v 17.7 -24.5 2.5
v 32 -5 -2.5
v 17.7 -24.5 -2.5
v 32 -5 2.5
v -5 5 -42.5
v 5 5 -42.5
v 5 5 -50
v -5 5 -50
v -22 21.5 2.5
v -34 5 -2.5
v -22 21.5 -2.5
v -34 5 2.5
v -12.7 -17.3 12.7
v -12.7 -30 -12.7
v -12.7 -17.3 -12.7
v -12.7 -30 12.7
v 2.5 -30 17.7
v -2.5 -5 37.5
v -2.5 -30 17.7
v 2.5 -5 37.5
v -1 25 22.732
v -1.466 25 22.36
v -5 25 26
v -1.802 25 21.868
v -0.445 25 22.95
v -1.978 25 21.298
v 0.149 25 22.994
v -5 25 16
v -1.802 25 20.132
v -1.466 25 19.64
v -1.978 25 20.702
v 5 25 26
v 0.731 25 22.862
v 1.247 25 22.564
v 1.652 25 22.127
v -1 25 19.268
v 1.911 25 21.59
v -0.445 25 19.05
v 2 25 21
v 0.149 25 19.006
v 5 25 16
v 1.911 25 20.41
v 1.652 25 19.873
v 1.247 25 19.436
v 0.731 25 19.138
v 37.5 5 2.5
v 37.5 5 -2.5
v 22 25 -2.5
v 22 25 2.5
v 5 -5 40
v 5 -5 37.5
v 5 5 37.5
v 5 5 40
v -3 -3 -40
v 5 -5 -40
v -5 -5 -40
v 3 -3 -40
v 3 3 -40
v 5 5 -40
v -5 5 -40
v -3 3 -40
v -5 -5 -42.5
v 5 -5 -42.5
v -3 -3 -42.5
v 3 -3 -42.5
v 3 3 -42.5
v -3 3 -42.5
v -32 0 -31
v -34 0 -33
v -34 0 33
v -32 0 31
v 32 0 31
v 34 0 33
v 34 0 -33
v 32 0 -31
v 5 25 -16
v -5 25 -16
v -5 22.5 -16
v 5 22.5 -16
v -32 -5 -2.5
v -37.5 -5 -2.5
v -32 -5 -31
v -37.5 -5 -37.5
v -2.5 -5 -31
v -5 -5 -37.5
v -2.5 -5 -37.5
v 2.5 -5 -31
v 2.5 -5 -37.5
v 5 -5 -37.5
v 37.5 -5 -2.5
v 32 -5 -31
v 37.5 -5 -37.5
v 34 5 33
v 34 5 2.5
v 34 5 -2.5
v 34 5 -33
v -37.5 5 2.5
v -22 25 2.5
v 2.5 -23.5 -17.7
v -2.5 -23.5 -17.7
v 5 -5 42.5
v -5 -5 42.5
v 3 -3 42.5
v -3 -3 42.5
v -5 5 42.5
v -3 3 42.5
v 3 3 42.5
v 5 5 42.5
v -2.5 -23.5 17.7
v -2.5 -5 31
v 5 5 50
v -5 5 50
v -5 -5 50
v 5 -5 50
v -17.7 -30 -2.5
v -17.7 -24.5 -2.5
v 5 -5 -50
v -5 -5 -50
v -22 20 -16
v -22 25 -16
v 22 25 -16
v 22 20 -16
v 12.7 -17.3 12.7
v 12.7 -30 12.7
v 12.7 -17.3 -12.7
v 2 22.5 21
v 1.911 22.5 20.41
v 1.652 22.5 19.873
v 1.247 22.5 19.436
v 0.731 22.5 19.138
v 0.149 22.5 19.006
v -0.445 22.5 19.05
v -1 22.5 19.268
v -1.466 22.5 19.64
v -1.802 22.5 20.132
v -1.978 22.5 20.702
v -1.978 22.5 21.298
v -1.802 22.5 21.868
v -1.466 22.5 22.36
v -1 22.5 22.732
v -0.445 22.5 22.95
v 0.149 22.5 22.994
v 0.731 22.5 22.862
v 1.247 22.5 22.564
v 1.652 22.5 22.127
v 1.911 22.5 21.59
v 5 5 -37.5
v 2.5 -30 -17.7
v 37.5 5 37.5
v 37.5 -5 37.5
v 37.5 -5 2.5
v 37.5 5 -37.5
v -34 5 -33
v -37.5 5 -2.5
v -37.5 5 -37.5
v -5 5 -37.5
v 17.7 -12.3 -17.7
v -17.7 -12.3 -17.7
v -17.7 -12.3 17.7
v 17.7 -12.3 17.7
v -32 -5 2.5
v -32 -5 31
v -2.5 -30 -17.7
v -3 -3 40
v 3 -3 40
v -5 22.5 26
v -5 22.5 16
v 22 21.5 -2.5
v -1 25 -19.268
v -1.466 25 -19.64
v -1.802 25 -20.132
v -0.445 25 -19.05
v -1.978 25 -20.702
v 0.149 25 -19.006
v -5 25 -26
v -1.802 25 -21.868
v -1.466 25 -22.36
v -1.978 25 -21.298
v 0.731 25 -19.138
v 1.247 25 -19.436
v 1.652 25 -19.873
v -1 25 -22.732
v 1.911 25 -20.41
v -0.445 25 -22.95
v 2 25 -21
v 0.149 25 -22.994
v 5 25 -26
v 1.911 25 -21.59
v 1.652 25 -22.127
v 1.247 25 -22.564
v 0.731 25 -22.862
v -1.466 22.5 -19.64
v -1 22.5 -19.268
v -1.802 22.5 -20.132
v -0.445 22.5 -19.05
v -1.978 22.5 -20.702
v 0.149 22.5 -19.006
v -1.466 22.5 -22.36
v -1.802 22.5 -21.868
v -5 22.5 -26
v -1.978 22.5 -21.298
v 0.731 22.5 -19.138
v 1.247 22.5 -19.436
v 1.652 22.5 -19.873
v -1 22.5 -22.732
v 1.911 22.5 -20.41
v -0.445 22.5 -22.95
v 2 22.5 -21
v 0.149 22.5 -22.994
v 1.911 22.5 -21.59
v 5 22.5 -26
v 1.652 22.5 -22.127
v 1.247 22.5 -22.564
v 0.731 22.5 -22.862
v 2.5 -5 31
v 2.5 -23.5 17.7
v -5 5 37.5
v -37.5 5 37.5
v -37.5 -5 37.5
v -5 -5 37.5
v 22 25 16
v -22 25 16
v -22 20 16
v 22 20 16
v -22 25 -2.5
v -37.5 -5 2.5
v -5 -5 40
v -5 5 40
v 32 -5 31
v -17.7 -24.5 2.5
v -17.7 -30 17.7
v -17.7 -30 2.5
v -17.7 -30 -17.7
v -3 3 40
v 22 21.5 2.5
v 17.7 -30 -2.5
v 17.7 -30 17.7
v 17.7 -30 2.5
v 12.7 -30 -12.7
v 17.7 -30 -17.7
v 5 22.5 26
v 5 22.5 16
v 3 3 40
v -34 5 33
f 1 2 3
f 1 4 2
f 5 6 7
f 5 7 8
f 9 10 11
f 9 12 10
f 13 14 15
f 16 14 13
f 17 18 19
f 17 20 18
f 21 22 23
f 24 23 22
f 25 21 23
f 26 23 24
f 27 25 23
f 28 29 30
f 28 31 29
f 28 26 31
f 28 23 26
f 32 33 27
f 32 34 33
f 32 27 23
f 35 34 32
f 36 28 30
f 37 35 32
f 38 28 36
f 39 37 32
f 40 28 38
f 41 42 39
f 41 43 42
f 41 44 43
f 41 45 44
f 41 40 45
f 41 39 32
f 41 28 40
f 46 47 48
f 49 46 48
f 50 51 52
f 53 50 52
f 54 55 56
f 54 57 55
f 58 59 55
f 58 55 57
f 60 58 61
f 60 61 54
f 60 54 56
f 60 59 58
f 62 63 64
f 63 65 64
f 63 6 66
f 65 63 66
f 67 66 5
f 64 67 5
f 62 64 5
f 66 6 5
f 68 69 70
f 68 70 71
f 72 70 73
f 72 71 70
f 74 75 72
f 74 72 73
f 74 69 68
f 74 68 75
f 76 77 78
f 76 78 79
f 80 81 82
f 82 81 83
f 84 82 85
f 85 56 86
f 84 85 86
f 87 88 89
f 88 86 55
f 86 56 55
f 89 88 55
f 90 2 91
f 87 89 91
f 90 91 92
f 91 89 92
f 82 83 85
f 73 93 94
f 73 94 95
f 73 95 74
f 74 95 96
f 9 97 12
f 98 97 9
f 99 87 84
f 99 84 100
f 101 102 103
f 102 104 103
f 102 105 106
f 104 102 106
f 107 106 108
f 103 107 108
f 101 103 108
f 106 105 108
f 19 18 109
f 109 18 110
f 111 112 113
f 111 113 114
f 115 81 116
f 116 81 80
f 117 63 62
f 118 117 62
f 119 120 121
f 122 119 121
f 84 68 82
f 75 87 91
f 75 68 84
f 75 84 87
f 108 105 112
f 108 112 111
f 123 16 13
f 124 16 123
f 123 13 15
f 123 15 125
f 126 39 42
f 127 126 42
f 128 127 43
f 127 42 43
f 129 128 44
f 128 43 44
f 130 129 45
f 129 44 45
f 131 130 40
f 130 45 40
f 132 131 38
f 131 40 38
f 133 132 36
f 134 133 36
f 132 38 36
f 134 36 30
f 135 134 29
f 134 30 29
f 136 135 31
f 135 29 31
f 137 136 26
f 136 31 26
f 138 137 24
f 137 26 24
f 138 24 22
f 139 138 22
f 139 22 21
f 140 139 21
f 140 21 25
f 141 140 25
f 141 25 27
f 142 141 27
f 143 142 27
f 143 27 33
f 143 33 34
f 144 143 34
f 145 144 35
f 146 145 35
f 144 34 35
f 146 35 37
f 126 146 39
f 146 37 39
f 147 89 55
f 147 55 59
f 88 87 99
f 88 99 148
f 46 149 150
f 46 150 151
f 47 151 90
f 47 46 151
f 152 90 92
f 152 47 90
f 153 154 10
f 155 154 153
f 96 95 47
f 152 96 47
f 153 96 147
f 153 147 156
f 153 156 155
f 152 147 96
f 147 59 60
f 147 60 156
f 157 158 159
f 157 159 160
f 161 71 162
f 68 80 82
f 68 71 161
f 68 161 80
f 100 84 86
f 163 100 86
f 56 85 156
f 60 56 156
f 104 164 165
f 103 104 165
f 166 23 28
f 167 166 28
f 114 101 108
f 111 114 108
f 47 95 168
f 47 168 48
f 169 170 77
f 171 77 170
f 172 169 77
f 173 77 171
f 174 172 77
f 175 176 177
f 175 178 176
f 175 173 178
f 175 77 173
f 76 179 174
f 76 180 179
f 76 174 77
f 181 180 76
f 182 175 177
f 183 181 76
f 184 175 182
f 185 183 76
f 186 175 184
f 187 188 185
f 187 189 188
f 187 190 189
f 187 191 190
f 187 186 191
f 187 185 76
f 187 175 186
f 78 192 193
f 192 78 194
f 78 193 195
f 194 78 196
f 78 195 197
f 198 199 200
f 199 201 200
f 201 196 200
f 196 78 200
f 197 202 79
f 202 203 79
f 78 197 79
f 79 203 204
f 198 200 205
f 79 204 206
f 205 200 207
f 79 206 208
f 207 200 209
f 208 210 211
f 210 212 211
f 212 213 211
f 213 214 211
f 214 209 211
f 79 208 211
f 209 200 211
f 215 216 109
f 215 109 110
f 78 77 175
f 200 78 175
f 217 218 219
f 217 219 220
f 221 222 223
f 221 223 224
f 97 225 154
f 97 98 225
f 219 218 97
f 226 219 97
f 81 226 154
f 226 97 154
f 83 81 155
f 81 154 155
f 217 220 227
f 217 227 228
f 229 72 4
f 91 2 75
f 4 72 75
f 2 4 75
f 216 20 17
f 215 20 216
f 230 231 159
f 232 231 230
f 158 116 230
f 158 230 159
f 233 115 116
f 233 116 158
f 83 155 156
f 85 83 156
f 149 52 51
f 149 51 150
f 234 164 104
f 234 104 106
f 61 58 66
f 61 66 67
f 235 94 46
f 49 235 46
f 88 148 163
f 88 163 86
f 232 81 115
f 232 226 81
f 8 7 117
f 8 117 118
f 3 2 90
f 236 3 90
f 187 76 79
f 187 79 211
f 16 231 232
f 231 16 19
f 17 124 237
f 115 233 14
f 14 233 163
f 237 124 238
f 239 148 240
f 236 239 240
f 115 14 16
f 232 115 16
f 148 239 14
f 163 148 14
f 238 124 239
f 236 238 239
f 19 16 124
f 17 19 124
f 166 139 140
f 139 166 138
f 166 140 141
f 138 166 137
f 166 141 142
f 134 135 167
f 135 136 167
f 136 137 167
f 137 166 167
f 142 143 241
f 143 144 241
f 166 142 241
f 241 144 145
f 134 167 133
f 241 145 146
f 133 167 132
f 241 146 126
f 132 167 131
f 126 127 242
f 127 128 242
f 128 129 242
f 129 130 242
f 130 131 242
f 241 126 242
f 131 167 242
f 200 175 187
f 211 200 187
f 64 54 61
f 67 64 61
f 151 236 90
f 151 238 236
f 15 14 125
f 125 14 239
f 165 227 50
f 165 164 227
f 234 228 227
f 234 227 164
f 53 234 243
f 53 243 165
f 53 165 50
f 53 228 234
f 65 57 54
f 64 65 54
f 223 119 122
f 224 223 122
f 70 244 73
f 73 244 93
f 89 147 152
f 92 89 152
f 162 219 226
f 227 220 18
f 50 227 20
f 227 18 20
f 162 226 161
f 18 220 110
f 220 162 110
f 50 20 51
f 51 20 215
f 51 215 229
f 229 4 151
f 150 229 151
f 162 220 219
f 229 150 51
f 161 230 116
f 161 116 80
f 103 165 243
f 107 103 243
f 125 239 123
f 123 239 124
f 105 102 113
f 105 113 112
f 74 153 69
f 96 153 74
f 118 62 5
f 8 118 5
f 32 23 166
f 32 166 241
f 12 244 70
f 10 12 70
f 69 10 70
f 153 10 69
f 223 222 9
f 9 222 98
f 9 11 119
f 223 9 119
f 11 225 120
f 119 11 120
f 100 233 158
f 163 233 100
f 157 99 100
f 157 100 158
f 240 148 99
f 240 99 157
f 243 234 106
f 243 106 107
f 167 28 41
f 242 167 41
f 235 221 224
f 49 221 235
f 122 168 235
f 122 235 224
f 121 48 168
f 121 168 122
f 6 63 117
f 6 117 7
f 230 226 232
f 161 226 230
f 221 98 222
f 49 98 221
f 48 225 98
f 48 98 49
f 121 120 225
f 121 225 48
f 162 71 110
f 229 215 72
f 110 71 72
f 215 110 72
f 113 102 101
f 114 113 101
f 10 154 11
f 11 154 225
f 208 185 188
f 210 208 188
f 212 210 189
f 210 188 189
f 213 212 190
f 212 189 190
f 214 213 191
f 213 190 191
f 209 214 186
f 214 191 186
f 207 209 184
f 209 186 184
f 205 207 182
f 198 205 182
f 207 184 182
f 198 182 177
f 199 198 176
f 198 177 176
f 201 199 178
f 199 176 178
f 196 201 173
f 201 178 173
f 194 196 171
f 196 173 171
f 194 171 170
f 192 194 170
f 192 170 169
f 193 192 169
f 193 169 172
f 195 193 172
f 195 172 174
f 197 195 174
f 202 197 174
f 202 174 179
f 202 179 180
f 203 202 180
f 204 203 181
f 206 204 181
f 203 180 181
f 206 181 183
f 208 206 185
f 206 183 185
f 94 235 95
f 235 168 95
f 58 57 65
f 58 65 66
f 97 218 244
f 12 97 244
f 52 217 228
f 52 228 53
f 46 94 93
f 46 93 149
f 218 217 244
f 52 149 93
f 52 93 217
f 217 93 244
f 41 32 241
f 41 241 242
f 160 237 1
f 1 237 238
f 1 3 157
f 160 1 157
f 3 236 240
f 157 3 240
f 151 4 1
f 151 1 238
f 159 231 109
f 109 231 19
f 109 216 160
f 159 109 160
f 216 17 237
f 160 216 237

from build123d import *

# Parameters (mm, degrees)
SKETCH2_W              = 75
SKETCH2_H              = 75
BOSS_EXTRUDE1_DEPTH    = 5
SKETCH2_2_W            = 75
SKETCH2_2_H            = 75
BOSS_EXTRUDE2_DEPTH    = 5
SKETCH4_W              = 68
SKETCH4_H              = 66
CUT_EXTRUDE1_DEPTH     = 5
SKETCH5_W              = 64
SKETCH5_H              = 62
CUT_EXTRUDE2_DEPTH     = 5
SKETCH6_W              = 10
SKETCH6_H              = 10
BOSS_EXTRUDE3_DEPTH    = 2.5
SKETCH7_W              = 6
SKETCH7_H              = 6
BOSS_EXTRUDE4_DEPTH    = 2.5
SKETCH8_W              = 10
SKETCH8_H              = 10
BOSS_EXTRUDE5_DEPTH    = 7.5
SKETCH9_W              = 10
SKETCH9_H              = 10
BOSS_EXTRUDE6_DEPTH    = 2.5
SKETCH10_W             = 6
SKETCH10_H             = 6
BOSS_EXTRUDE7_DEPTH    = 2.5
SKETCH11_W             = 10
SKETCH11_H             = 10
BOSS_EXTRUDE8_DEPTH    = 7.5
SKETCH12_W             = 35.4
SKETCH12_H             = 35.4
BOSS_EXTRUDE9_DEPTH    = 17.7
SKETCH13_W             = 25.4
SKETCH13_H             = 25.4
CUT_EXTRUDE3_DEPTH     = 12.7
SKETCH14_W             = 44
SKETCH14_H             = 32
BOSS_EXTRUDE10_DEPTH   = 5
BOSS_EXTRUDE11_DEPTH   = 2.5
BOSS_EXTRUDE12_DEPTH   = 2.5
BOSS_EXTRUDE13_DEPTH   = 2.5
BOSS_EXTRUDE14_DEPTH   = 2.5
BOSS_EXTRUDE21_DEPTH   = 2.5
BOSS_EXTRUDE22_DEPTH   = 2.5
BOSS_EXTRUDE23_DEPTH   = 2.5
BOSS_EXTRUDE24_DEPTH   = 2.5
SKETCH22_W             = 10
SKETCH22_H             = 10
BOSS_EXTRUDE25_DEPTH   = 2.5
BOSS_EXTRUDE25_2_DEPTH = 2.5
SKETCH23_R             = 2
CUT_EXTRUDE4_DEPTH     = 2.5


with BuildPart() as part:
    # Sketch2 → Boss-Extrude1 (new body)
    with BuildSketch(Plane(origin=(0, 0, 0), x_dir=(1, 0, 0), z_dir=(0, 1, 0))):
        Rectangle(SKETCH2_W, SKETCH2_H)
    extrude(amount=BOSS_EXTRUDE1_DEPTH)

    # Sketch2<2> → Boss-Extrude2 (add)
    with BuildSketch(Plane(origin=(0, 0, 0), x_dir=(1, 0, 0), z_dir=(0, 1, 0))):
        Rectangle(SKETCH2_2_W, SKETCH2_2_H)
    extrude(amount=-BOSS_EXTRUDE2_DEPTH)

    # Sketch4 → Cut-Extrude1 (cut)
    with BuildSketch(Plane(origin=(0, 5, 0), x_dir=(1, 0, 0), z_dir=(0, 1, 0))):
        Rectangle(SKETCH4_W, SKETCH4_H)
    extrude(amount=-CUT_EXTRUDE1_DEPTH, mode=Mode.SUBTRACT)

    # Sketch5 → Cut-Extrude2 (cut)
    with BuildSketch(Plane(origin=(0, 0, 0), x_dir=(1, 0, 0), z_dir=(0, 1, 0))):
        Rectangle(SKETCH5_W, SKETCH5_H)
    extrude(amount=-CUT_EXTRUDE2_DEPTH, mode=Mode.SUBTRACT)

    # Sketch6 → Boss-Extrude3 (add)
    with BuildSketch(Plane.XY.offset(37.5)):
        Rectangle(SKETCH6_W, SKETCH6_H)
    extrude(amount=BOSS_EXTRUDE3_DEPTH)

    # Sketch7 → Boss-Extrude4 (add)
    with BuildSketch(Plane.XY.offset(40)):
        Rectangle(SKETCH7_W, SKETCH7_H)
    extrude(amount=BOSS_EXTRUDE4_DEPTH)

    # Sketch8 → Boss-Extrude5 (add)
    with BuildSketch(Plane.XY.offset(42.5)):
        Rectangle(SKETCH8_W, SKETCH8_H)
    extrude(amount=BOSS_EXTRUDE5_DEPTH)

    # Sketch9 → Boss-Extrude6 (add)
    with BuildSketch(Plane(origin=(0, 0, -37.5), x_dir=(-1, 0, 0), z_dir=(0, 0, -1))):
        Rectangle(SKETCH9_W, SKETCH9_H)
    extrude(amount=BOSS_EXTRUDE6_DEPTH)

    # Sketch10 → Boss-Extrude7 (add)
    with BuildSketch(Plane(origin=(0, 0, -40), x_dir=(-1, 0, 0), z_dir=(0, 0, -1))):
        Rectangle(SKETCH10_W, SKETCH10_H)
    extrude(amount=BOSS_EXTRUDE7_DEPTH)

    # Sketch11 → Boss-Extrude8 (add)
    with BuildSketch(Plane(origin=(0, 0, -42.5), x_dir=(-1, 0, 0), z_dir=(0, 0, -1))):
        Rectangle(SKETCH11_W, SKETCH11_H)
    extrude(amount=BOSS_EXTRUDE8_DEPTH)



with BuildPart() as body_2:
    # Sketch12 → Boss-Extrude9 (new body)
    with BuildSketch(Plane(origin=(0, -30, 0), x_dir=(1, 0, 0), z_dir=(0, 1, 0))):
        Rectangle(SKETCH12_W, SKETCH12_H)
    extrude(amount=BOSS_EXTRUDE9_DEPTH)

    # Sketch13 → Cut-Extrude3 (cut)
    with BuildSketch(Plane.XZ.offset(30)):
        Rectangle(SKETCH13_W, SKETCH13_H)
    extrude(amount=-CUT_EXTRUDE3_DEPTH, mode=Mode.SUBTRACT)


with BuildPart() as body_3:
    # Sketch14 → Boss-Extrude10 (new body)
    with BuildSketch(Plane(origin=(0, 25, 0), x_dir=(1, 0, 0), z_dir=(0, 1, 0))):
        Rectangle(SKETCH14_W, SKETCH14_H)
    extrude(amount=-BOSS_EXTRUDE10_DEPTH)


with BuildPart() as part_1:
    add(part.part)

    add(body_2.part)  # Boss-Extrude11 merges body 2
    # Sketch15 → Boss-Extrude11 (add)
    with BuildSketch(Plane.XY):
        Polygon((17.7, -30), (37.5, -5), (32, -5), (17.7, -24.5), align=None)
    extrude(amount=BOSS_EXTRUDE11_DEPTH)

    # Sketch15<2> → Boss-Extrude12 (add)
    with BuildSketch(Plane.XY):
        Polygon((17.7, -30), (37.5, -5), (32, -5), (17.7, -24.5), align=None)
    extrude(amount=-BOSS_EXTRUDE12_DEPTH)

    # Sketch17 → Boss-Extrude13 (add)
    with BuildSketch(Plane.XY):
        Polygon((-37.5, -5), (-17.7, -30), (-17.7, -24.5), (-32, -5), align=None)
    extrude(amount=BOSS_EXTRUDE13_DEPTH)

    # Sketch17<2> → Boss-Extrude14 (add)
    with BuildSketch(Plane.XY):
        Polygon((-37.5, -5), (-17.7, -30), (-17.7, -24.5), (-32, -5), align=None)
    extrude(amount=-BOSS_EXTRUDE14_DEPTH)


    add(body_3.part)  # Boss-Extrude21 merges body 3
    # Sketch21 → Boss-Extrude21 (add)
    with BuildSketch(Plane.XY):
        Polygon((-22, 25), (-37.5, 5), (-34, 5), (-22, 21.5), align=None)
        Polygon((37.5, 5), (22, 25), (22, 21.5), (34, 5), align=None)
    extrude(amount=BOSS_EXTRUDE21_DEPTH)

    # Sketch21<2> → Boss-Extrude22 (add)
    with BuildSketch(Plane.XY):
        Polygon((-22, 25), (-37.5, 5), (-34, 5), (-22, 21.5), align=None)
        Polygon((37.5, 5), (22, 25), (22, 21.5), (34, 5), align=None)
    extrude(amount=-BOSS_EXTRUDE22_DEPTH)

    # Sketch20 → Boss-Extrude23 (add)
    with BuildSketch(Plane(origin=(0, 0, 0), x_dir=(0, 0, -1), z_dir=(1, 0, 0))):
        Polygon((-37.5, -5), (-17.7, -30), (-17.7, -23.5), (-31, -5), align=None)
        Polygon((17.7, -30), (37.5, -5), (31, -5), (17.7, -23.5), align=None)
    extrude(amount=BOSS_EXTRUDE23_DEPTH)

    # Sketch20<3> → Boss-Extrude24 (add)
    with BuildSketch(Plane(origin=(0, 0, 0), x_dir=(0, 0, -1), z_dir=(1, 0, 0))):
        Polygon((-37.5, -5), (-17.7, -30), (-17.7, -23.5), (-31, -5), align=None)
        Polygon((17.7, -30), (37.5, -5), (31, -5), (17.7, -23.5), align=None)
    extrude(amount=-BOSS_EXTRUDE24_DEPTH)


with BuildPart() as body_2_2:
    # Sketch22 → Boss-Extrude25 (new body)
    with BuildSketch(Plane(origin=(0, 25, 0), x_dir=(1, 0, 0), z_dir=(0, 1, 0))):
        with Locations((0, 21)):
            Rectangle(SKETCH22_W, SKETCH22_H)
    extrude(amount=-BOSS_EXTRUDE25_DEPTH)


with BuildPart() as body_3_2:
    # Sketch22 → Boss-Extrude25 2 (new body)
    with BuildSketch(Plane(origin=(0, 25, 0), x_dir=(1, 0, 0), z_dir=(0, 1, 0))):
        with Locations((0, -21)):
            Rectangle(SKETCH22_W, SKETCH22_H)
    extrude(amount=-BOSS_EXTRUDE25_2_DEPTH)


with BuildPart() as cut_extrude4_tool:
    # Sketch23 → Cut-Extrude4 (new body)
    with BuildSketch(Plane(origin=(0, 25, 0), x_dir=(1, 0, 0), z_dir=(0, 1, 0))):
        with Locations((0, 21)):
            Circle(SKETCH23_R)
        with Locations((0, -21)):
            Circle(SKETCH23_R)
    extrude(amount=-CUT_EXTRUDE4_DEPTH)


with BuildPart() as body_2_2_1:
    add(body_2_2.part)

    # Cut-Extrude4: cut by cut_extrude4_tool
    add(cut_extrude4_tool.part, mode=Mode.SUBTRACT)


with BuildPart() as body_3_2_1:
    add(body_3_2.part)

    # Cut-Extrude4: cut by cut_extrude4_tool
    add(cut_extrude4_tool.part, mode=Mode.SUBTRACT)


solid = Compound([part_1.part, body_2_2_1.part, body_3_2_1.part])
